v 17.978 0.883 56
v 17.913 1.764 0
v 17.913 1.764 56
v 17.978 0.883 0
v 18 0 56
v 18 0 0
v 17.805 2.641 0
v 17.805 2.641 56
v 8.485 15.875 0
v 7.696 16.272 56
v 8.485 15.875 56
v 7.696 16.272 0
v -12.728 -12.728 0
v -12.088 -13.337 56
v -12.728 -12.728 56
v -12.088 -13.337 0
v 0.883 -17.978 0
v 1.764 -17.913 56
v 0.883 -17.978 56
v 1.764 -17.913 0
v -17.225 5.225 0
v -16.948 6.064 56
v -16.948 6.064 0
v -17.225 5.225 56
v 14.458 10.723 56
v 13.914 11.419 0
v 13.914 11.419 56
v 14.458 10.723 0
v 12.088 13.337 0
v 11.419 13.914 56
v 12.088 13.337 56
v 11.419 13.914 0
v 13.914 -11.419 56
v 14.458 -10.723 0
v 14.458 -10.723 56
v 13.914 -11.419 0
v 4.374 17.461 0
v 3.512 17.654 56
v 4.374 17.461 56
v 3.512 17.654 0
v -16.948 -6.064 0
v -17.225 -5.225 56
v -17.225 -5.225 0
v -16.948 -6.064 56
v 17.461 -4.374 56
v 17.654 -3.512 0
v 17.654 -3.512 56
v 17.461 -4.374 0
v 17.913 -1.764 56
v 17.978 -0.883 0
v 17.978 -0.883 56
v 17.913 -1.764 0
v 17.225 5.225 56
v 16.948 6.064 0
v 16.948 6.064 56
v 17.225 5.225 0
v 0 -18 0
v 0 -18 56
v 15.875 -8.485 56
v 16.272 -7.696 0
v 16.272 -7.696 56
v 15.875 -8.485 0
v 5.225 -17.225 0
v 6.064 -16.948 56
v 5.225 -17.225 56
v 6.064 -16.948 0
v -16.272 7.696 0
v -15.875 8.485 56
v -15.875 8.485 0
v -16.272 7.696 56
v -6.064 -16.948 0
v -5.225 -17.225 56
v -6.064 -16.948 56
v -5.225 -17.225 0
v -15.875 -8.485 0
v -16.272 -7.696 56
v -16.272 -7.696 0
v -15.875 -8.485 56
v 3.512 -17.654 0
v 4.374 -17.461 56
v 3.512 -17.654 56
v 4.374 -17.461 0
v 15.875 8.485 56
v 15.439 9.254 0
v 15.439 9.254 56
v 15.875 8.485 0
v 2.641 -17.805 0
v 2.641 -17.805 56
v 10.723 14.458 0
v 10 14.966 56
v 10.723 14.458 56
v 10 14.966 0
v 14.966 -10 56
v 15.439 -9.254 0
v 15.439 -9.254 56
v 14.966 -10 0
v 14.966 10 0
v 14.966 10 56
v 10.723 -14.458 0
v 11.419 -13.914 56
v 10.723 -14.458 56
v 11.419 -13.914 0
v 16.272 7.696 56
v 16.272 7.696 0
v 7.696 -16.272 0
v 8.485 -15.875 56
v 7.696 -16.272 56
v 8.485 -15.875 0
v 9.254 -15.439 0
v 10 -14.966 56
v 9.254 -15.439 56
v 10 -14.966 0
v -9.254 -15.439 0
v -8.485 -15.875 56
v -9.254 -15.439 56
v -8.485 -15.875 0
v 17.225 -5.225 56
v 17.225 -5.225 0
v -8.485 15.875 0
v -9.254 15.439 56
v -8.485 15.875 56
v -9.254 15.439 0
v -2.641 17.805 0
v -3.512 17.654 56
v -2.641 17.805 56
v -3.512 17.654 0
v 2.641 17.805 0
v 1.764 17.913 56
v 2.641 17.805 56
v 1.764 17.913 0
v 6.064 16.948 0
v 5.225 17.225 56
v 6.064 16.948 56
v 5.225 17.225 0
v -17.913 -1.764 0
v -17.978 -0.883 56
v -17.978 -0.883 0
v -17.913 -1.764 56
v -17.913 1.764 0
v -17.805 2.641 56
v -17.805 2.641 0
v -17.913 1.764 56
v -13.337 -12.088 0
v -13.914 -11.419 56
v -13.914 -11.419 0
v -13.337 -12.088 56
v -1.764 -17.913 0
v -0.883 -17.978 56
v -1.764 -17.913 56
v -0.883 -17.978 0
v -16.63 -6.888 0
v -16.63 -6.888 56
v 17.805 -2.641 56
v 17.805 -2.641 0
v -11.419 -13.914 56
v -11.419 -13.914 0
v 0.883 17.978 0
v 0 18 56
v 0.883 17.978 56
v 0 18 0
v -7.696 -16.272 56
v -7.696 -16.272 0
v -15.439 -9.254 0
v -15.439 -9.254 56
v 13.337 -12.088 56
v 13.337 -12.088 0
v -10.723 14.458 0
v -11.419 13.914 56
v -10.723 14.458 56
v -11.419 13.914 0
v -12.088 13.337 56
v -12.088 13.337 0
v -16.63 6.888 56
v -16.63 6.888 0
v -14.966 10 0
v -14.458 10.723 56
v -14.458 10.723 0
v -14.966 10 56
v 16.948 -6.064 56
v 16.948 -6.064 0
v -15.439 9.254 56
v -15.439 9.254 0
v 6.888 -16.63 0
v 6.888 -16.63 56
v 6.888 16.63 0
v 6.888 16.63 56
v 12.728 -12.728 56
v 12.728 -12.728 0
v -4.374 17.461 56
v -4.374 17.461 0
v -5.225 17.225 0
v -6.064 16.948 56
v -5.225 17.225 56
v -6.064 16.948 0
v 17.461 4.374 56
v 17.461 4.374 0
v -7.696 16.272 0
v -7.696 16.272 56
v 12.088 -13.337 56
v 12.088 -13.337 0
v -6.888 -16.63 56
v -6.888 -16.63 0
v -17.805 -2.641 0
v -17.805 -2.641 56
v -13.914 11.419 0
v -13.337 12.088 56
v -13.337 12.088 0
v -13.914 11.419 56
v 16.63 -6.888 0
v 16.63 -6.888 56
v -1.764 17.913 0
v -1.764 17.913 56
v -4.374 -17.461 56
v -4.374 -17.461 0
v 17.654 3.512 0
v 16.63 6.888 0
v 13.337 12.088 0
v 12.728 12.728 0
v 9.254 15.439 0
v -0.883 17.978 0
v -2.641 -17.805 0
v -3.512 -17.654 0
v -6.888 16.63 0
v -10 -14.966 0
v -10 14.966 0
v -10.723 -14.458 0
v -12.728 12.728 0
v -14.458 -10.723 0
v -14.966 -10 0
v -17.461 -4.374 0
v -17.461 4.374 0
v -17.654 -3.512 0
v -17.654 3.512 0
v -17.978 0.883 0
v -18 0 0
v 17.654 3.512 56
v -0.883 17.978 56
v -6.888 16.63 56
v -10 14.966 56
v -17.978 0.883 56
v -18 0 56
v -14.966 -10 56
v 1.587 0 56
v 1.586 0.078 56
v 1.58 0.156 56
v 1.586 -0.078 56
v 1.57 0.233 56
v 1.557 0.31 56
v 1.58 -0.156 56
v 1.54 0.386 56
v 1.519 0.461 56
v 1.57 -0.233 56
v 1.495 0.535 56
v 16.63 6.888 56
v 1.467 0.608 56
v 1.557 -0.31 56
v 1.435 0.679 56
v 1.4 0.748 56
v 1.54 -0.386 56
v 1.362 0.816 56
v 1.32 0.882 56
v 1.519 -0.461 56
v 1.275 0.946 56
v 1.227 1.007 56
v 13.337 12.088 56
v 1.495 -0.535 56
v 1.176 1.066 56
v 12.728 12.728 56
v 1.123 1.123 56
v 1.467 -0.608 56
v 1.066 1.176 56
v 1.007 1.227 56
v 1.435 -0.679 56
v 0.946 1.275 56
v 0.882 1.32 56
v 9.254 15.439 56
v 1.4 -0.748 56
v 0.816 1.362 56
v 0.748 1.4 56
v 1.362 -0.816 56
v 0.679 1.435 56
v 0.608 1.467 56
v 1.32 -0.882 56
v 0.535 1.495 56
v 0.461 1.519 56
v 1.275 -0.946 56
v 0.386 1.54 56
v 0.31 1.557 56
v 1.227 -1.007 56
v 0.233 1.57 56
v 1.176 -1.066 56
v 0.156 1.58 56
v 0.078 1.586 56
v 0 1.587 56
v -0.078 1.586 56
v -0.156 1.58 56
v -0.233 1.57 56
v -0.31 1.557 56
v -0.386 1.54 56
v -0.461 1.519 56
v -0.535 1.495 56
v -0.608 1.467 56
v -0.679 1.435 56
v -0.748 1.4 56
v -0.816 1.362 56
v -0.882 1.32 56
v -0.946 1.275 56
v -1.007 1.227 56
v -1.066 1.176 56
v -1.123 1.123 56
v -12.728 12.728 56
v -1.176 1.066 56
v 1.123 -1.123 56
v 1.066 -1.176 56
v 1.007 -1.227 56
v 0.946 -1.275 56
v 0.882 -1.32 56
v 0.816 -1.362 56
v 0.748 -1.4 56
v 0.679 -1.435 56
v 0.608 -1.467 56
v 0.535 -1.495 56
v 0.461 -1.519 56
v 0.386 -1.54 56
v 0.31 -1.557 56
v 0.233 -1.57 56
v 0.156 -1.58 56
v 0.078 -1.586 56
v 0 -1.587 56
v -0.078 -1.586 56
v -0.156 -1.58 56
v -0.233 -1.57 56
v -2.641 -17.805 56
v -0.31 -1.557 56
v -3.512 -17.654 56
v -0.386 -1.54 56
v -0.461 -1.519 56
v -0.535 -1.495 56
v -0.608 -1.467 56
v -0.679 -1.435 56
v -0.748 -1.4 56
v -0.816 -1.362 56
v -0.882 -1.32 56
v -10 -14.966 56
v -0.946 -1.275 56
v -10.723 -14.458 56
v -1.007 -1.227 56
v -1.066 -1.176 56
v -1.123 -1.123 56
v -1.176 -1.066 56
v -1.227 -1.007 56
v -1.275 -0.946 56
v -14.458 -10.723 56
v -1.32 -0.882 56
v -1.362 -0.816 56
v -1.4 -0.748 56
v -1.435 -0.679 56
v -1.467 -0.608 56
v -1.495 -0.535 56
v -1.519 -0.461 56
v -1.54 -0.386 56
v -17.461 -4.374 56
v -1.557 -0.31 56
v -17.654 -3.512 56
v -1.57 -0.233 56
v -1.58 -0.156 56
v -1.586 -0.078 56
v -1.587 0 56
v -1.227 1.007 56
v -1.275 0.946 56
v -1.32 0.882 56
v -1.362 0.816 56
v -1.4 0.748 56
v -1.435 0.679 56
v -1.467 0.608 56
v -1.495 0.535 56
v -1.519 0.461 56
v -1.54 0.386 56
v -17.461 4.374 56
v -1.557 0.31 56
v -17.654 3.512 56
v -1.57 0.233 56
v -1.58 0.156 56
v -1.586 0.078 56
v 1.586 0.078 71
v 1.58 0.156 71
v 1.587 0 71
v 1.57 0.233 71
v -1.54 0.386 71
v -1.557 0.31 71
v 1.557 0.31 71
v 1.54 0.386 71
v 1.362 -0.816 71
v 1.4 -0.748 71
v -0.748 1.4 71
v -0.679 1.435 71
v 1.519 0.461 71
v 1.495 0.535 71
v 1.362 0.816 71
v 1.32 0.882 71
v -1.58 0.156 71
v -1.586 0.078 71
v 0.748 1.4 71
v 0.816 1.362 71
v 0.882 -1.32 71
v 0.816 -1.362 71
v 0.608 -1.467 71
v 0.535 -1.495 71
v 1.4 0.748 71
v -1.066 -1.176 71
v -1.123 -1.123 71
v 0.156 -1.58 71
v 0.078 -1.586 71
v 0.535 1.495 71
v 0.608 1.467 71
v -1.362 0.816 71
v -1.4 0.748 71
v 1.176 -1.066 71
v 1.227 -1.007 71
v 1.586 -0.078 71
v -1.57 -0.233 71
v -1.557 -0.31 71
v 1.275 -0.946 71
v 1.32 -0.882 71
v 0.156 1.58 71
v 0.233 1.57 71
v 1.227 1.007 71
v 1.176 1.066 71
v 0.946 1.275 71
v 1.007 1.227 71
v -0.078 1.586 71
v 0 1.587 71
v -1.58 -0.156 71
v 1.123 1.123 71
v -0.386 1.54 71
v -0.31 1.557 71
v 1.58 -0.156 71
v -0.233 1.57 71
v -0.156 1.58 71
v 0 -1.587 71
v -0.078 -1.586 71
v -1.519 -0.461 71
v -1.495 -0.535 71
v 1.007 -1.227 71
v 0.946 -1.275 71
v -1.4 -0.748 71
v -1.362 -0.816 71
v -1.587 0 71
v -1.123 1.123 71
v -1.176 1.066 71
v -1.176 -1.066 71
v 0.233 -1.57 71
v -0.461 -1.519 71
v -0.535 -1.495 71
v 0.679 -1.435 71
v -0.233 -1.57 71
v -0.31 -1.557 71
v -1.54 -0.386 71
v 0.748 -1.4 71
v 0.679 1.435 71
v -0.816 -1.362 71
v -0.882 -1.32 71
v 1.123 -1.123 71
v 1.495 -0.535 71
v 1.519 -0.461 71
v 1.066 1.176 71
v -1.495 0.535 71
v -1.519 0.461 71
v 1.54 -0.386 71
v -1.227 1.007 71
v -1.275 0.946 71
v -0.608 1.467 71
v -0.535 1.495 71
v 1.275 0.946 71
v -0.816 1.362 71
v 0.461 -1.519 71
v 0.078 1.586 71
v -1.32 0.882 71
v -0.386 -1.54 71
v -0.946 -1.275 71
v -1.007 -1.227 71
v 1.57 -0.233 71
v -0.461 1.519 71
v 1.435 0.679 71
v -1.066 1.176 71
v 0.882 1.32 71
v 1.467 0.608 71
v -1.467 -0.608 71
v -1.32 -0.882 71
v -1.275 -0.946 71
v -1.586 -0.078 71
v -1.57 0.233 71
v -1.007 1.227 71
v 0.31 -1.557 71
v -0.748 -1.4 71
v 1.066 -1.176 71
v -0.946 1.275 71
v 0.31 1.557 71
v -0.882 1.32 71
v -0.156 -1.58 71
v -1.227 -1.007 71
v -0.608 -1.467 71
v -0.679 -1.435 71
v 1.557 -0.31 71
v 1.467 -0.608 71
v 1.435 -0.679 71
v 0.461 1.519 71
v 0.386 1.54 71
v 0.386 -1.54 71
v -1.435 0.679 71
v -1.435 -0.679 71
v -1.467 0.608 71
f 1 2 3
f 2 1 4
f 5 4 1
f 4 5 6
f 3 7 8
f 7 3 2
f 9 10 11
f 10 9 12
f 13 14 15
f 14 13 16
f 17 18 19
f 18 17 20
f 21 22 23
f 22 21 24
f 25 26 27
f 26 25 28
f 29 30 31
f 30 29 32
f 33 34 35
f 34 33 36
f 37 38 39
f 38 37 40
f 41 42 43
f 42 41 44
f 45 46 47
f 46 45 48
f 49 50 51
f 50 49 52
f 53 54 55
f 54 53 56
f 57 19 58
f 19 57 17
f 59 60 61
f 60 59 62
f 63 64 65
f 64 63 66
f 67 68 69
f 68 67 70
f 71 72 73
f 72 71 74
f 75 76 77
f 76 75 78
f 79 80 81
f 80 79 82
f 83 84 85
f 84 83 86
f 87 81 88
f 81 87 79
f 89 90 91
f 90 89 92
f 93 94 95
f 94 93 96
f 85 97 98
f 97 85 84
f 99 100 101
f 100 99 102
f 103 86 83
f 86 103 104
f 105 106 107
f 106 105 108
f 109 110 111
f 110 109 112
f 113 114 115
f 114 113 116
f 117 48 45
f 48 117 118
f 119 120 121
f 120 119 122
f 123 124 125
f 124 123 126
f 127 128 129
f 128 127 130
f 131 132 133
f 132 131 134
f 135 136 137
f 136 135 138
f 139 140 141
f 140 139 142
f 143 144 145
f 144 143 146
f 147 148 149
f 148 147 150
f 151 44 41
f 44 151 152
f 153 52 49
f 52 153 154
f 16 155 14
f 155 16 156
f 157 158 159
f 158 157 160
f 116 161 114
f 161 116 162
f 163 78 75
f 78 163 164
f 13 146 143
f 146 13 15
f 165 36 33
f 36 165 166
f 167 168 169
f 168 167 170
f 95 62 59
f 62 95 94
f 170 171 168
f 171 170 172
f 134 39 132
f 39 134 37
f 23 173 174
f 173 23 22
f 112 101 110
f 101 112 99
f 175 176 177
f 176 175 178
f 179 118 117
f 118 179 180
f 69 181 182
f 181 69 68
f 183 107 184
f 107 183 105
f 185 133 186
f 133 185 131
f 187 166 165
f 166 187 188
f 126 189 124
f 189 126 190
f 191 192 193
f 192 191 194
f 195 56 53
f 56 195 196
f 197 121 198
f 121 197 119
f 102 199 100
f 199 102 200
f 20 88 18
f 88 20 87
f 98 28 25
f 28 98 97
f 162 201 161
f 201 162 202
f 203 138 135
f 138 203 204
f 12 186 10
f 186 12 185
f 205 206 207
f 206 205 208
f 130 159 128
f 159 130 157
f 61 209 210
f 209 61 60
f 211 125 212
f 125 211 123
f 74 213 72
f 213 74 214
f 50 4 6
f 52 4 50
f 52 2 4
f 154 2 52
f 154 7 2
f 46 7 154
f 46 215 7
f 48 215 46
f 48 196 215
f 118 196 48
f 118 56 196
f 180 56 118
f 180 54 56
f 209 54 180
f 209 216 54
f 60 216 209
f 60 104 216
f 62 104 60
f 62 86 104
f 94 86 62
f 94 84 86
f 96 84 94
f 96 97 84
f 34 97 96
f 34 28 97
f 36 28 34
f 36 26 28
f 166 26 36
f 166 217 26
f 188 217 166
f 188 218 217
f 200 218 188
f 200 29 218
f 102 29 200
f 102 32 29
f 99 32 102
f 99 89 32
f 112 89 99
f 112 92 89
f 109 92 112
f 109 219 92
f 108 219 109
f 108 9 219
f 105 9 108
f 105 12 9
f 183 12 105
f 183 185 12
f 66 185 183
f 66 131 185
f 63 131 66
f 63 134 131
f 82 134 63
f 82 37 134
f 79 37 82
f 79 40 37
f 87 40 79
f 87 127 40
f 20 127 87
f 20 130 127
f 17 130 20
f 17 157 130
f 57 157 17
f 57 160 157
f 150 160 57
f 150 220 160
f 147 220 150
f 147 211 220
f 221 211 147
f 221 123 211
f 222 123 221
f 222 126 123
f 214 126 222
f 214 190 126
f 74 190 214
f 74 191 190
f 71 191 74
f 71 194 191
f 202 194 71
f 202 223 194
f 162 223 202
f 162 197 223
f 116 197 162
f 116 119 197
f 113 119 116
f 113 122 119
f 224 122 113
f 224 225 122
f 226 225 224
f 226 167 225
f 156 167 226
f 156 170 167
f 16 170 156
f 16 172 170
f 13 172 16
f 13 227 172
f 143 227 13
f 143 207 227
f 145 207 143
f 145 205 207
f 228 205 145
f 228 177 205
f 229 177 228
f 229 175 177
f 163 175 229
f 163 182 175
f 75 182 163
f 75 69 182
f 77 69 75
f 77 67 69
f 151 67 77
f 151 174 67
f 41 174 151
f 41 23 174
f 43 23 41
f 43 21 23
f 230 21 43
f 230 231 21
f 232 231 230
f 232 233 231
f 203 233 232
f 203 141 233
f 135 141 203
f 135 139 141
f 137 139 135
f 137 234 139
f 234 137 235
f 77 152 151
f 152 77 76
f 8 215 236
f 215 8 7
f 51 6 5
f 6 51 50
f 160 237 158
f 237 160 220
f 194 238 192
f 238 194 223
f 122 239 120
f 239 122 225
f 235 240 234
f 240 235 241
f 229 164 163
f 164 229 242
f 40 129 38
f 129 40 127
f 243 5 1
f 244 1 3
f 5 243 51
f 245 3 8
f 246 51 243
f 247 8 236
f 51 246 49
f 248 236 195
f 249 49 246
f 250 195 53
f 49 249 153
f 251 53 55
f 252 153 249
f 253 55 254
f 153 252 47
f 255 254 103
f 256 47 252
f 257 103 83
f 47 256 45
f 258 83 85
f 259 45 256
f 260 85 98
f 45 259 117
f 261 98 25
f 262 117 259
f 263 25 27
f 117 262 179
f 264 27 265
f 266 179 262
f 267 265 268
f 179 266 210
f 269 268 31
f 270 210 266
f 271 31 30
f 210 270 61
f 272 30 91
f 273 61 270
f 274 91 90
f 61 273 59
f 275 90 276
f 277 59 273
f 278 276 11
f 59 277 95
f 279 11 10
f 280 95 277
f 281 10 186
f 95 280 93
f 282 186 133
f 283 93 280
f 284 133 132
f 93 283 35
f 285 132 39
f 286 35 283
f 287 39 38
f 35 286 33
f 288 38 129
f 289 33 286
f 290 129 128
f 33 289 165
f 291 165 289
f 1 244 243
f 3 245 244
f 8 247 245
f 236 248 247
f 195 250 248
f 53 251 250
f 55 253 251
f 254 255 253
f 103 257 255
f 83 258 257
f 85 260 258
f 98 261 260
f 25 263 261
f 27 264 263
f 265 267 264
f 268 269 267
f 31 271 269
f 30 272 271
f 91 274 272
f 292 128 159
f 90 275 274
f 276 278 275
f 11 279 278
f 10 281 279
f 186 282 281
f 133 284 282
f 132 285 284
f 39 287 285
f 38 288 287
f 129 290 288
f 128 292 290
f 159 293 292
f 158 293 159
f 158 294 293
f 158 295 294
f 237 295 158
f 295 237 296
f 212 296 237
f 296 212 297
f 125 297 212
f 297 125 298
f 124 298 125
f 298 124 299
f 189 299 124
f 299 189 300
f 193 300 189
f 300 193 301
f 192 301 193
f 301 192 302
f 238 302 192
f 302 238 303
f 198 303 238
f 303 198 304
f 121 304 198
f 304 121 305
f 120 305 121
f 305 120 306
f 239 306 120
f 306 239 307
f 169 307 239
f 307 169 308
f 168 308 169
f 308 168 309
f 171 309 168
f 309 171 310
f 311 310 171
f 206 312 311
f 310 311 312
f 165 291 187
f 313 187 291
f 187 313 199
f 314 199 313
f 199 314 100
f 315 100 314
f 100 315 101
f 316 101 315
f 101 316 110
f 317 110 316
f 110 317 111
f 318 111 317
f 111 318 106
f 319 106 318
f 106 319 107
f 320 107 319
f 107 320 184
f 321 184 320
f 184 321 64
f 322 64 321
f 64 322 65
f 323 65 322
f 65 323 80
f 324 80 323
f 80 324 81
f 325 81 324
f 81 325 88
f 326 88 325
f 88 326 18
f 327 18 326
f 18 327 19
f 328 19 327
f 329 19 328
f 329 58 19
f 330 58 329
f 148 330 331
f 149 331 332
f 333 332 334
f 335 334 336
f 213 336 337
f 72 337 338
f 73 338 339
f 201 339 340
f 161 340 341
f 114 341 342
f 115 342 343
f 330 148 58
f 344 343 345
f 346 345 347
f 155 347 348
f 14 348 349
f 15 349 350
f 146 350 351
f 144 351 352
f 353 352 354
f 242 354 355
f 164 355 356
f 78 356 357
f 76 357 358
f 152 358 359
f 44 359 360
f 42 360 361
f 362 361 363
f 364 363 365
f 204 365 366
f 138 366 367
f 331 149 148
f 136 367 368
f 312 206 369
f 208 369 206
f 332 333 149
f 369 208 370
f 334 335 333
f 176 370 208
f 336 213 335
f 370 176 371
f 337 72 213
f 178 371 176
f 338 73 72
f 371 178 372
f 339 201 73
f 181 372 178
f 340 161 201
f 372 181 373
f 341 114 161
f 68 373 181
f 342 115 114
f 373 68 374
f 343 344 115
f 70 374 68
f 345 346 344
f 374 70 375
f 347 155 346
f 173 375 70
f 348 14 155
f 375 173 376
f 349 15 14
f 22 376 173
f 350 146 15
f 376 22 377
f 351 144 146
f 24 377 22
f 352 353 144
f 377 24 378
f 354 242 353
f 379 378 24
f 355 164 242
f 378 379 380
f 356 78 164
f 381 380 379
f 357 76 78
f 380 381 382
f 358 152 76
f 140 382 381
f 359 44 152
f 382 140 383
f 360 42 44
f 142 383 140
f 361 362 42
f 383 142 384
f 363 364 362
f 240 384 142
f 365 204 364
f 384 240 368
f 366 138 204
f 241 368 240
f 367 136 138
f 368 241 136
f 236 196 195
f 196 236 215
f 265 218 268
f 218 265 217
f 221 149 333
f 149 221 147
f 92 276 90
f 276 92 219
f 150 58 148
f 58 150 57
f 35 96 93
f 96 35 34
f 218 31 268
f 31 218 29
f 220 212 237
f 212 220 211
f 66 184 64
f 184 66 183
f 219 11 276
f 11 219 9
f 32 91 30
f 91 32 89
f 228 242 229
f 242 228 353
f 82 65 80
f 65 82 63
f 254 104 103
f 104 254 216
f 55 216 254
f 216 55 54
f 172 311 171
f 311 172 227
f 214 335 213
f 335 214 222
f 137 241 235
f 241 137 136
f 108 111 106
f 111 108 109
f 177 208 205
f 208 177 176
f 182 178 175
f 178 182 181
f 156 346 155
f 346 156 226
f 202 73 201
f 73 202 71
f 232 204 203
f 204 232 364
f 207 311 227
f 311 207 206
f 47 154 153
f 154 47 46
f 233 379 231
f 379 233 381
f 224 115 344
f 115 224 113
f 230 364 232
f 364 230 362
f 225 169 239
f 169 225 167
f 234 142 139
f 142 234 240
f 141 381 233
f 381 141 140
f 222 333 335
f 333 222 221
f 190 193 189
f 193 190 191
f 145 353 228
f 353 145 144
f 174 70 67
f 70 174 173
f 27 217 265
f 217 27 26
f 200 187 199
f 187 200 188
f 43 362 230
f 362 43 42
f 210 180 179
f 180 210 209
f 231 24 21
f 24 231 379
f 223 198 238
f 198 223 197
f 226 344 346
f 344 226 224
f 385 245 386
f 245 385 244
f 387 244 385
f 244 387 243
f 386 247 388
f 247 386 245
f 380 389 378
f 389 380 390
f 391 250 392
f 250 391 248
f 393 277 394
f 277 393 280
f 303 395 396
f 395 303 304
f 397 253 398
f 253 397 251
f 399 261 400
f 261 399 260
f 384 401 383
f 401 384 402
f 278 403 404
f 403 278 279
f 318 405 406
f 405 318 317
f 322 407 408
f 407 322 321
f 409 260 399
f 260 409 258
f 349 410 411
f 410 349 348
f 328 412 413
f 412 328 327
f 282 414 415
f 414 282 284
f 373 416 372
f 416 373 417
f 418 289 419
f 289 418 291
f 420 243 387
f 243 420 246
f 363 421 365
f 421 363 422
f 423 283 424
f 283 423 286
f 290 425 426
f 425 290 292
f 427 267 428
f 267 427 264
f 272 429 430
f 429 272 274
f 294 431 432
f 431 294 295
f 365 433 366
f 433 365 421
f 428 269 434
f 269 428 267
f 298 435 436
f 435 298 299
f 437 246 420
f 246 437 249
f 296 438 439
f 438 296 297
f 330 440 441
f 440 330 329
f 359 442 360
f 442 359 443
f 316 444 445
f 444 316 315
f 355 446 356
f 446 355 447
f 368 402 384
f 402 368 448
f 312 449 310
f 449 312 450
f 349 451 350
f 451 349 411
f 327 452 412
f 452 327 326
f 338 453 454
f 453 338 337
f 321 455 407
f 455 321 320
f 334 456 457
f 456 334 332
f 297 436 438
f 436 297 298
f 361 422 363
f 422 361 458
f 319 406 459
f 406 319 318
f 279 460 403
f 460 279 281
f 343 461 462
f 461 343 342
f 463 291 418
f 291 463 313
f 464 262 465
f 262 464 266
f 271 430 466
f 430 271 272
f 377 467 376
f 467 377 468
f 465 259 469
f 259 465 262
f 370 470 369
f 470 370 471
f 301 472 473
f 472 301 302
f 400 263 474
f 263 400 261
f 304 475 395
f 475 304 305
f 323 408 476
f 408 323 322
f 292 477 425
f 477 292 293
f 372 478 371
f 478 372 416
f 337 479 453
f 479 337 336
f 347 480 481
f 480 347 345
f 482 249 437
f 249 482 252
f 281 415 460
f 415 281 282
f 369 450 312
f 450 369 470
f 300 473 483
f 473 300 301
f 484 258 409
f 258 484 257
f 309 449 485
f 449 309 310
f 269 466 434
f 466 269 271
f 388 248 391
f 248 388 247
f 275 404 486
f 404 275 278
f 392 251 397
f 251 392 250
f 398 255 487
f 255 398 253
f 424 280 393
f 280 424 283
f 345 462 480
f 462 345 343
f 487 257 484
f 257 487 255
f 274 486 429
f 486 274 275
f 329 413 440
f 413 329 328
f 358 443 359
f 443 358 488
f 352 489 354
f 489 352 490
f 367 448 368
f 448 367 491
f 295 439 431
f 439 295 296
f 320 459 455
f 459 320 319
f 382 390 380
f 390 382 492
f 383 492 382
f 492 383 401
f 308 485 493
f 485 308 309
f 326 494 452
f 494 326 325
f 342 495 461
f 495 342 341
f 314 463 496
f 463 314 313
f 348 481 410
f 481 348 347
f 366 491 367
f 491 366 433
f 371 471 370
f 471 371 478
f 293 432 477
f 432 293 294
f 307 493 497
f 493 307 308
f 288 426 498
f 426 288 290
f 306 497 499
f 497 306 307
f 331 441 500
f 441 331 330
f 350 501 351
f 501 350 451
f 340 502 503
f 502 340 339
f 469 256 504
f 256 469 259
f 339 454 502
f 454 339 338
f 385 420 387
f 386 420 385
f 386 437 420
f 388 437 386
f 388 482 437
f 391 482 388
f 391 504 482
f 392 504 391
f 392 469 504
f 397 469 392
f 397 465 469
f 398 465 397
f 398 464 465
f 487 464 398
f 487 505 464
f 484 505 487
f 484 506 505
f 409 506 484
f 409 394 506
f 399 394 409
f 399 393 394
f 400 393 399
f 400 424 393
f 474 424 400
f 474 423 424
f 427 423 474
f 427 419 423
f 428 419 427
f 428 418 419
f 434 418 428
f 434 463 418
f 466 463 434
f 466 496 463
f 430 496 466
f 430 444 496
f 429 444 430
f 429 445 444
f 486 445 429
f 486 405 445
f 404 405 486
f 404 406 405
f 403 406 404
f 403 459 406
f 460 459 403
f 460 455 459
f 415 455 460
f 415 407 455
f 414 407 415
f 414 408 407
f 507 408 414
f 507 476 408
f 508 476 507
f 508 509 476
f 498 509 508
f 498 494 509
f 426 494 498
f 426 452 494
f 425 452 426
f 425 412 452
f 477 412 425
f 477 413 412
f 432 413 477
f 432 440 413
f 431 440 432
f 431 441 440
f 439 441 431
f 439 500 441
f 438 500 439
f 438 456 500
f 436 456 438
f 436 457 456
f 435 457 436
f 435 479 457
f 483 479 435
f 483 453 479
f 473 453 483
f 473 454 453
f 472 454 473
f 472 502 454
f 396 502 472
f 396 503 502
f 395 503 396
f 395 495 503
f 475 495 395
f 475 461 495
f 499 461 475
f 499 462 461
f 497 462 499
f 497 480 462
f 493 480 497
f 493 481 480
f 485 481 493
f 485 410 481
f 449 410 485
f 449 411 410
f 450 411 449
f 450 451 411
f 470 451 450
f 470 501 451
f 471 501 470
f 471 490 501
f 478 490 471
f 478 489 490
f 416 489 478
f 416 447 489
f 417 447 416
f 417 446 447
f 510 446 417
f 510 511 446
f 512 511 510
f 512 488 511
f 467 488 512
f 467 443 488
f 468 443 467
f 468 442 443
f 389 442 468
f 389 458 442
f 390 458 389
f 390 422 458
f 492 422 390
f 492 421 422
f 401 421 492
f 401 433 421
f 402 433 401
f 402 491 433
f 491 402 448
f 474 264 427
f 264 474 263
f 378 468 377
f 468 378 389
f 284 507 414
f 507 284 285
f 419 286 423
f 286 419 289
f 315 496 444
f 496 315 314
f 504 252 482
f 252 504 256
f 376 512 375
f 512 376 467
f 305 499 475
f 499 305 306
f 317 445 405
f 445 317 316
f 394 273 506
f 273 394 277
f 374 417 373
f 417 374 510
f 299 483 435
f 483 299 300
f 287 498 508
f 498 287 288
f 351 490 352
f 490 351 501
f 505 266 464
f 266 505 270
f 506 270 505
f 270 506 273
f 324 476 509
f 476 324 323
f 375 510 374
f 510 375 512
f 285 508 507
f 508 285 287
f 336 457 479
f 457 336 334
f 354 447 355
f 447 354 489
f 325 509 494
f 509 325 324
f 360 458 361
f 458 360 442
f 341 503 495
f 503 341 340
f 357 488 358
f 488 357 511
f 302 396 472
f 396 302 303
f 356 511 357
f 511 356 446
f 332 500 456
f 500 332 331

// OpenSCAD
// file: constants.scad
$fn = 128;
clearance = 0.2;        // wherever parts meet
print_head_width = 0.4; // 3d printer head diameter
print_no_support_angle = 50;  // overhang angle that needs no support

//spec_dart_d = 19;     // mega dart diameter
//d_len = 95;           // mega dart length
spec_dart_d = 13;       // spec elite dart diameter
d_len = 72;             // elite dart length
min_chamber_count = 15; // minimum chambers per cylinder
desired_cuff_d = 98;    // minimum cuff diameter in mm
jam_slot_width = 5.6;   // multiple of head diameter
race1 = 15;             // bottom edge of bearing race position.
bearing_w = 4 + 1;
bearing_d = 10;
bearing_inner_d = 5;
ratchet_angle = -20;

brushless_motor_d = 22;
brushless_motor_h = 12;
brushless_motor_screw_d = 5;
brushless_motor_screw_mount_r = 19/2;

// calculated constants
w_thickness = 4 * print_head_width; //multiples of 3d printer head diameter -> 1.6
flywheel_thickness = w_thickness * 2;
cyl_inner_thickness = w_thickness;

dart_d = ceil((spec_dart_d + 2 * clearance)/print_head_width) * print_head_width;
echo("calculated dart_d", dart_d);
dart_r = dart_d/2;
toroid_r = dart_d + w_thickness;

jam_slot_support_len = jam_slot_width * 2;
jam_slot_offset_from_top = (toroid_r + jam_slot_support_len +  jam_slot_width * sqrt(2)/2);

// Calculate the number of chambers based on chamber count and minimum cuff diameter
cuff_to_dart_delta = 3 * w_thickness + cyl_inner_thickness + dart_r;
calc_cyl_radius = desired_cuff_d/2 + cuff_to_dart_delta;
calc_cyl_deg = 2 * asin((dart_r + w_thickness/2)/calc_cyl_radius);
calc_ch_count = ceil(360/calc_cyl_deg);  // always round up

chamber_count = max([min_chamber_count, calc_ch_count]);
echo("minimum chamber count", min_chamber_count);
echo("final_chamber_count ", chamber_count);

brushless_motor_screw_mount_side = brushless_motor_screw_mount_r * sqrt(2);
motormount_w = (dart_r + flywheel_thickness) * 2 + brushless_motor_d;

cyl_len = d_len + w_thickness * 2;
race2 = cyl_len - race1 - bearing_w; // bottom edge of upper bearing
chamber_r = dart_r + w_thickness;
chamber_d = chamber_r * 2;
cyl_degrees = 360/chamber_count;
// chambers only need 1 w_thickness between each other
cyl_draw_radius = (dart_r + w_thickness/2) / sin(cyl_degrees/2);

echo("Minimum dart length", toroid_r + motormount_w/2);

inner_r = cyl_draw_radius - dart_r - w_thickness;
final_inner = inner_r - cyl_inner_thickness;
race_r = final_inner + w_thickness;

// ratchet constants
post_d = w_thickness * 2;
slot_l = chamber_d + post_d; // a little extra movement
ratchet_l = chamber_d*2 + slot_l + post_d;
ratchet_w = post_d + w_thickness * 2;
ratchet_t = w_thickness * 1.5;

// constants for the motor mount and cylinder mount
cuff_outer_r = final_inner - w_thickness;
cuff_inner_r = cuff_outer_r - w_thickness;

echo("desired inner cuff diameter ", desired_cuff_d);
echo("final inner cuff diameter ", cuff_inner_r * 2);

cuff_h = cyl_len + w_thickness *2;
flange_r = cuff_outer_r + toroid_r;
bearing_mount_r = race_r - bearing_d/2;
mount_offset = race_r - bearing_d - w_thickness * 2;
mount_w = sqrt(cuff_outer_r * cuff_outer_r - mount_offset * mount_offset) * 2;
m_thickness = w_thickness * 2;
mount_alignment = m_thickness + (flywheel_thickness + brushless_motor_h)/2;
slider_t = cyl_draw_radius - mount_alignment - mount_offset;
slider_offset = slider_t + brushless_motor_screw_d/2 + w_thickness;

// returns a list of angles for the points of a regular polygon
function regular_polygon_angles(order) = [for (i=[0:order-1]) i*(360/order)];

// returns a list of coordinates and angle for the endpoints of a regular polygon
function regular_polygon_translation(order, r=1) = [
    for (th=regular_polygon_angles(order)) [[r*cos(th), r*sin(th), 0], th]];

module pipe(h, inner, outer) {
    difference() {
        cylinder(h, r=outer);
        cylinder(h, r=inner);
    }
}
module toroid(circle_r, toroid_r, convexity=10) {
    rotate_extrude(convexity)
    translate([toroid_r, 0, 0]) circle(r = circle_r);

}
module slide_slot(w, h, l, c=-clearance) {
    t_w = w * 2/3;
    t_l = l/2 + c;
    // clearance can be negative when building the part that goes inside
    difference() {
        union() {
            cube([w-t_w, h, l], center=true);
            translate([0, 0, l-t_l])
                resize([t_w + c , 0, 0]) rotate([0, 45, 0])
                cube([t_w, h, t_w], center=true);
        }
        translate([0, 0, l])
            cube([l, h, l], center=true);
        
    }
}

module slide_mount(slider_w, slider_l, slider_t, top=true) {
    if (top==true) {
        difference() {
            cube([slider_w, slider_l, slider_t], center=true);
            slide_slot(slider_w, slider_l, slider_t);
        }
    } else {
        slide_slot(slider_w, slider_l, slider_t);
    }
}

module flange(){
    pipe(w_thickness, cuff_inner_r, flange_r);
}

module cuff (cuff_angle, height=(cuff_h + motormount_w)) {
    union(){
        difference () {
            difference () {
                union () {
                    pipe(height, cuff_inner_r, cuff_outer_r);
                    flange();
                }
                translate([mount_offset + (toroid_r + bearing_d + w_thickness *2)/2, 0, height/2])
                    cube([toroid_r + bearing_d + w_thickness *2, mount_w, height], center=true);
            }
            translate([mount_offset, 0, height])
                rotate([0, -cuff_angle, 0])
                translate([0, 0, cyl_draw_radius/2])
                // just a big block to remove
                cube([cyl_draw_radius * 4, cyl_draw_radius * 2, cyl_draw_radius], center=true);
        }
        translate([cyl_draw_radius, 0, 0])
            linear_extrude(1)
            text("X", size=dart_d, halign="center", valign="center");
    }
}
// main file
include <constants.scad>
cuff_angle = atan((motormount_w- w_thickness*2)/(cuff_outer_r * 2 - mount_offset/2));
pusher_throw = cyl_len - jam_slot_offset_from_top;
pusher_overthrow = pusher_throw  + jam_slot_support_len;
echo("pusher_throw:", pusher_throw);
echo("pusher_overthrow:", pusher_overthrow);
height_to_flywheels = cyl_len + motormount_w/2;
echo("height_to_flywheels:", height_to_flywheels);
connecting_rod_len = pusher_overthrow + post_d;
connecting_rod_w = 8;
connecting_rod_t = 5;

module motor_540(){
    union(){
        cylinder(56, d=36);
        translate([0, 0, 56])
            cylinder(15, d=25.4/8);
    }
}
module connecting_rod(){
    difference() {
        union () {
            translate([pusher_overthrow/2 + post_d/2, 0, connecting_rod_t])
                cylinder(connecting_rod_t, d=post_d);
            hull() {
                translate([connecting_rod_len/2, 0, 0])
                    cylinder(connecting_rod_t, d=connecting_rod_w);
                translate([-connecting_rod_len/2, 0, 0])
                    cylinder(connecting_rod_t, d=connecting_rod_w);
            }
        }
        translate([-pusher_overthrow/2 - post_d/2, 0, 0])
            cylinder(connecting_rod_t, d=post_d);
    }
}

module pusher_wheel(){
    union() {
        difference() {
            union() {
                cylinder(2, d=70);
                cylinder(5, d=pusher_overthrow + post_d);
            }
            cylinder(connecting_rod_t, d=post_d);
        }
        translate([pusher_overthrow/2, 0, 5])
            cylinder(connecting_rod_t, d=post_d);
        translate([connecting_rod_len/2 + pusher_overthrow/2 -post_d/2 -w_thickness*2, 0, connecting_rod_t])
            connecting_rod();
    }
}

module bearing_plate() {
    translate([mount_offset - w_thickness/2, 0, 0]) {
        union () {
            translate([0, 0, (cuff_h + motormount_w)/2])
                cube([w_thickness, mount_w, cuff_h + motormount_w], center=true);
            translate([w_thickness/2, 0, pusher_overthrow * 2])
                rotate([0, 90, 0])
                pusher_wheel();
            }
    }
}

module printable_cylinder_mount() {
    difference() {
        union () {
            cuff(cuff_angle);
            bearing_plate();
        }
        *translate([0, 0, cuff_h + motormount_w + sin(cuff_angle)*cyl_draw_radius/2])
            rotate([0, -cuff_angle, 0])
                // just a big block to remove
                cube([cyl_draw_radius * 4, cyl_draw_radius * 2, cyl_draw_radius], center=true);
    }
}

//printable_cylinder_mount();
motor_540();
